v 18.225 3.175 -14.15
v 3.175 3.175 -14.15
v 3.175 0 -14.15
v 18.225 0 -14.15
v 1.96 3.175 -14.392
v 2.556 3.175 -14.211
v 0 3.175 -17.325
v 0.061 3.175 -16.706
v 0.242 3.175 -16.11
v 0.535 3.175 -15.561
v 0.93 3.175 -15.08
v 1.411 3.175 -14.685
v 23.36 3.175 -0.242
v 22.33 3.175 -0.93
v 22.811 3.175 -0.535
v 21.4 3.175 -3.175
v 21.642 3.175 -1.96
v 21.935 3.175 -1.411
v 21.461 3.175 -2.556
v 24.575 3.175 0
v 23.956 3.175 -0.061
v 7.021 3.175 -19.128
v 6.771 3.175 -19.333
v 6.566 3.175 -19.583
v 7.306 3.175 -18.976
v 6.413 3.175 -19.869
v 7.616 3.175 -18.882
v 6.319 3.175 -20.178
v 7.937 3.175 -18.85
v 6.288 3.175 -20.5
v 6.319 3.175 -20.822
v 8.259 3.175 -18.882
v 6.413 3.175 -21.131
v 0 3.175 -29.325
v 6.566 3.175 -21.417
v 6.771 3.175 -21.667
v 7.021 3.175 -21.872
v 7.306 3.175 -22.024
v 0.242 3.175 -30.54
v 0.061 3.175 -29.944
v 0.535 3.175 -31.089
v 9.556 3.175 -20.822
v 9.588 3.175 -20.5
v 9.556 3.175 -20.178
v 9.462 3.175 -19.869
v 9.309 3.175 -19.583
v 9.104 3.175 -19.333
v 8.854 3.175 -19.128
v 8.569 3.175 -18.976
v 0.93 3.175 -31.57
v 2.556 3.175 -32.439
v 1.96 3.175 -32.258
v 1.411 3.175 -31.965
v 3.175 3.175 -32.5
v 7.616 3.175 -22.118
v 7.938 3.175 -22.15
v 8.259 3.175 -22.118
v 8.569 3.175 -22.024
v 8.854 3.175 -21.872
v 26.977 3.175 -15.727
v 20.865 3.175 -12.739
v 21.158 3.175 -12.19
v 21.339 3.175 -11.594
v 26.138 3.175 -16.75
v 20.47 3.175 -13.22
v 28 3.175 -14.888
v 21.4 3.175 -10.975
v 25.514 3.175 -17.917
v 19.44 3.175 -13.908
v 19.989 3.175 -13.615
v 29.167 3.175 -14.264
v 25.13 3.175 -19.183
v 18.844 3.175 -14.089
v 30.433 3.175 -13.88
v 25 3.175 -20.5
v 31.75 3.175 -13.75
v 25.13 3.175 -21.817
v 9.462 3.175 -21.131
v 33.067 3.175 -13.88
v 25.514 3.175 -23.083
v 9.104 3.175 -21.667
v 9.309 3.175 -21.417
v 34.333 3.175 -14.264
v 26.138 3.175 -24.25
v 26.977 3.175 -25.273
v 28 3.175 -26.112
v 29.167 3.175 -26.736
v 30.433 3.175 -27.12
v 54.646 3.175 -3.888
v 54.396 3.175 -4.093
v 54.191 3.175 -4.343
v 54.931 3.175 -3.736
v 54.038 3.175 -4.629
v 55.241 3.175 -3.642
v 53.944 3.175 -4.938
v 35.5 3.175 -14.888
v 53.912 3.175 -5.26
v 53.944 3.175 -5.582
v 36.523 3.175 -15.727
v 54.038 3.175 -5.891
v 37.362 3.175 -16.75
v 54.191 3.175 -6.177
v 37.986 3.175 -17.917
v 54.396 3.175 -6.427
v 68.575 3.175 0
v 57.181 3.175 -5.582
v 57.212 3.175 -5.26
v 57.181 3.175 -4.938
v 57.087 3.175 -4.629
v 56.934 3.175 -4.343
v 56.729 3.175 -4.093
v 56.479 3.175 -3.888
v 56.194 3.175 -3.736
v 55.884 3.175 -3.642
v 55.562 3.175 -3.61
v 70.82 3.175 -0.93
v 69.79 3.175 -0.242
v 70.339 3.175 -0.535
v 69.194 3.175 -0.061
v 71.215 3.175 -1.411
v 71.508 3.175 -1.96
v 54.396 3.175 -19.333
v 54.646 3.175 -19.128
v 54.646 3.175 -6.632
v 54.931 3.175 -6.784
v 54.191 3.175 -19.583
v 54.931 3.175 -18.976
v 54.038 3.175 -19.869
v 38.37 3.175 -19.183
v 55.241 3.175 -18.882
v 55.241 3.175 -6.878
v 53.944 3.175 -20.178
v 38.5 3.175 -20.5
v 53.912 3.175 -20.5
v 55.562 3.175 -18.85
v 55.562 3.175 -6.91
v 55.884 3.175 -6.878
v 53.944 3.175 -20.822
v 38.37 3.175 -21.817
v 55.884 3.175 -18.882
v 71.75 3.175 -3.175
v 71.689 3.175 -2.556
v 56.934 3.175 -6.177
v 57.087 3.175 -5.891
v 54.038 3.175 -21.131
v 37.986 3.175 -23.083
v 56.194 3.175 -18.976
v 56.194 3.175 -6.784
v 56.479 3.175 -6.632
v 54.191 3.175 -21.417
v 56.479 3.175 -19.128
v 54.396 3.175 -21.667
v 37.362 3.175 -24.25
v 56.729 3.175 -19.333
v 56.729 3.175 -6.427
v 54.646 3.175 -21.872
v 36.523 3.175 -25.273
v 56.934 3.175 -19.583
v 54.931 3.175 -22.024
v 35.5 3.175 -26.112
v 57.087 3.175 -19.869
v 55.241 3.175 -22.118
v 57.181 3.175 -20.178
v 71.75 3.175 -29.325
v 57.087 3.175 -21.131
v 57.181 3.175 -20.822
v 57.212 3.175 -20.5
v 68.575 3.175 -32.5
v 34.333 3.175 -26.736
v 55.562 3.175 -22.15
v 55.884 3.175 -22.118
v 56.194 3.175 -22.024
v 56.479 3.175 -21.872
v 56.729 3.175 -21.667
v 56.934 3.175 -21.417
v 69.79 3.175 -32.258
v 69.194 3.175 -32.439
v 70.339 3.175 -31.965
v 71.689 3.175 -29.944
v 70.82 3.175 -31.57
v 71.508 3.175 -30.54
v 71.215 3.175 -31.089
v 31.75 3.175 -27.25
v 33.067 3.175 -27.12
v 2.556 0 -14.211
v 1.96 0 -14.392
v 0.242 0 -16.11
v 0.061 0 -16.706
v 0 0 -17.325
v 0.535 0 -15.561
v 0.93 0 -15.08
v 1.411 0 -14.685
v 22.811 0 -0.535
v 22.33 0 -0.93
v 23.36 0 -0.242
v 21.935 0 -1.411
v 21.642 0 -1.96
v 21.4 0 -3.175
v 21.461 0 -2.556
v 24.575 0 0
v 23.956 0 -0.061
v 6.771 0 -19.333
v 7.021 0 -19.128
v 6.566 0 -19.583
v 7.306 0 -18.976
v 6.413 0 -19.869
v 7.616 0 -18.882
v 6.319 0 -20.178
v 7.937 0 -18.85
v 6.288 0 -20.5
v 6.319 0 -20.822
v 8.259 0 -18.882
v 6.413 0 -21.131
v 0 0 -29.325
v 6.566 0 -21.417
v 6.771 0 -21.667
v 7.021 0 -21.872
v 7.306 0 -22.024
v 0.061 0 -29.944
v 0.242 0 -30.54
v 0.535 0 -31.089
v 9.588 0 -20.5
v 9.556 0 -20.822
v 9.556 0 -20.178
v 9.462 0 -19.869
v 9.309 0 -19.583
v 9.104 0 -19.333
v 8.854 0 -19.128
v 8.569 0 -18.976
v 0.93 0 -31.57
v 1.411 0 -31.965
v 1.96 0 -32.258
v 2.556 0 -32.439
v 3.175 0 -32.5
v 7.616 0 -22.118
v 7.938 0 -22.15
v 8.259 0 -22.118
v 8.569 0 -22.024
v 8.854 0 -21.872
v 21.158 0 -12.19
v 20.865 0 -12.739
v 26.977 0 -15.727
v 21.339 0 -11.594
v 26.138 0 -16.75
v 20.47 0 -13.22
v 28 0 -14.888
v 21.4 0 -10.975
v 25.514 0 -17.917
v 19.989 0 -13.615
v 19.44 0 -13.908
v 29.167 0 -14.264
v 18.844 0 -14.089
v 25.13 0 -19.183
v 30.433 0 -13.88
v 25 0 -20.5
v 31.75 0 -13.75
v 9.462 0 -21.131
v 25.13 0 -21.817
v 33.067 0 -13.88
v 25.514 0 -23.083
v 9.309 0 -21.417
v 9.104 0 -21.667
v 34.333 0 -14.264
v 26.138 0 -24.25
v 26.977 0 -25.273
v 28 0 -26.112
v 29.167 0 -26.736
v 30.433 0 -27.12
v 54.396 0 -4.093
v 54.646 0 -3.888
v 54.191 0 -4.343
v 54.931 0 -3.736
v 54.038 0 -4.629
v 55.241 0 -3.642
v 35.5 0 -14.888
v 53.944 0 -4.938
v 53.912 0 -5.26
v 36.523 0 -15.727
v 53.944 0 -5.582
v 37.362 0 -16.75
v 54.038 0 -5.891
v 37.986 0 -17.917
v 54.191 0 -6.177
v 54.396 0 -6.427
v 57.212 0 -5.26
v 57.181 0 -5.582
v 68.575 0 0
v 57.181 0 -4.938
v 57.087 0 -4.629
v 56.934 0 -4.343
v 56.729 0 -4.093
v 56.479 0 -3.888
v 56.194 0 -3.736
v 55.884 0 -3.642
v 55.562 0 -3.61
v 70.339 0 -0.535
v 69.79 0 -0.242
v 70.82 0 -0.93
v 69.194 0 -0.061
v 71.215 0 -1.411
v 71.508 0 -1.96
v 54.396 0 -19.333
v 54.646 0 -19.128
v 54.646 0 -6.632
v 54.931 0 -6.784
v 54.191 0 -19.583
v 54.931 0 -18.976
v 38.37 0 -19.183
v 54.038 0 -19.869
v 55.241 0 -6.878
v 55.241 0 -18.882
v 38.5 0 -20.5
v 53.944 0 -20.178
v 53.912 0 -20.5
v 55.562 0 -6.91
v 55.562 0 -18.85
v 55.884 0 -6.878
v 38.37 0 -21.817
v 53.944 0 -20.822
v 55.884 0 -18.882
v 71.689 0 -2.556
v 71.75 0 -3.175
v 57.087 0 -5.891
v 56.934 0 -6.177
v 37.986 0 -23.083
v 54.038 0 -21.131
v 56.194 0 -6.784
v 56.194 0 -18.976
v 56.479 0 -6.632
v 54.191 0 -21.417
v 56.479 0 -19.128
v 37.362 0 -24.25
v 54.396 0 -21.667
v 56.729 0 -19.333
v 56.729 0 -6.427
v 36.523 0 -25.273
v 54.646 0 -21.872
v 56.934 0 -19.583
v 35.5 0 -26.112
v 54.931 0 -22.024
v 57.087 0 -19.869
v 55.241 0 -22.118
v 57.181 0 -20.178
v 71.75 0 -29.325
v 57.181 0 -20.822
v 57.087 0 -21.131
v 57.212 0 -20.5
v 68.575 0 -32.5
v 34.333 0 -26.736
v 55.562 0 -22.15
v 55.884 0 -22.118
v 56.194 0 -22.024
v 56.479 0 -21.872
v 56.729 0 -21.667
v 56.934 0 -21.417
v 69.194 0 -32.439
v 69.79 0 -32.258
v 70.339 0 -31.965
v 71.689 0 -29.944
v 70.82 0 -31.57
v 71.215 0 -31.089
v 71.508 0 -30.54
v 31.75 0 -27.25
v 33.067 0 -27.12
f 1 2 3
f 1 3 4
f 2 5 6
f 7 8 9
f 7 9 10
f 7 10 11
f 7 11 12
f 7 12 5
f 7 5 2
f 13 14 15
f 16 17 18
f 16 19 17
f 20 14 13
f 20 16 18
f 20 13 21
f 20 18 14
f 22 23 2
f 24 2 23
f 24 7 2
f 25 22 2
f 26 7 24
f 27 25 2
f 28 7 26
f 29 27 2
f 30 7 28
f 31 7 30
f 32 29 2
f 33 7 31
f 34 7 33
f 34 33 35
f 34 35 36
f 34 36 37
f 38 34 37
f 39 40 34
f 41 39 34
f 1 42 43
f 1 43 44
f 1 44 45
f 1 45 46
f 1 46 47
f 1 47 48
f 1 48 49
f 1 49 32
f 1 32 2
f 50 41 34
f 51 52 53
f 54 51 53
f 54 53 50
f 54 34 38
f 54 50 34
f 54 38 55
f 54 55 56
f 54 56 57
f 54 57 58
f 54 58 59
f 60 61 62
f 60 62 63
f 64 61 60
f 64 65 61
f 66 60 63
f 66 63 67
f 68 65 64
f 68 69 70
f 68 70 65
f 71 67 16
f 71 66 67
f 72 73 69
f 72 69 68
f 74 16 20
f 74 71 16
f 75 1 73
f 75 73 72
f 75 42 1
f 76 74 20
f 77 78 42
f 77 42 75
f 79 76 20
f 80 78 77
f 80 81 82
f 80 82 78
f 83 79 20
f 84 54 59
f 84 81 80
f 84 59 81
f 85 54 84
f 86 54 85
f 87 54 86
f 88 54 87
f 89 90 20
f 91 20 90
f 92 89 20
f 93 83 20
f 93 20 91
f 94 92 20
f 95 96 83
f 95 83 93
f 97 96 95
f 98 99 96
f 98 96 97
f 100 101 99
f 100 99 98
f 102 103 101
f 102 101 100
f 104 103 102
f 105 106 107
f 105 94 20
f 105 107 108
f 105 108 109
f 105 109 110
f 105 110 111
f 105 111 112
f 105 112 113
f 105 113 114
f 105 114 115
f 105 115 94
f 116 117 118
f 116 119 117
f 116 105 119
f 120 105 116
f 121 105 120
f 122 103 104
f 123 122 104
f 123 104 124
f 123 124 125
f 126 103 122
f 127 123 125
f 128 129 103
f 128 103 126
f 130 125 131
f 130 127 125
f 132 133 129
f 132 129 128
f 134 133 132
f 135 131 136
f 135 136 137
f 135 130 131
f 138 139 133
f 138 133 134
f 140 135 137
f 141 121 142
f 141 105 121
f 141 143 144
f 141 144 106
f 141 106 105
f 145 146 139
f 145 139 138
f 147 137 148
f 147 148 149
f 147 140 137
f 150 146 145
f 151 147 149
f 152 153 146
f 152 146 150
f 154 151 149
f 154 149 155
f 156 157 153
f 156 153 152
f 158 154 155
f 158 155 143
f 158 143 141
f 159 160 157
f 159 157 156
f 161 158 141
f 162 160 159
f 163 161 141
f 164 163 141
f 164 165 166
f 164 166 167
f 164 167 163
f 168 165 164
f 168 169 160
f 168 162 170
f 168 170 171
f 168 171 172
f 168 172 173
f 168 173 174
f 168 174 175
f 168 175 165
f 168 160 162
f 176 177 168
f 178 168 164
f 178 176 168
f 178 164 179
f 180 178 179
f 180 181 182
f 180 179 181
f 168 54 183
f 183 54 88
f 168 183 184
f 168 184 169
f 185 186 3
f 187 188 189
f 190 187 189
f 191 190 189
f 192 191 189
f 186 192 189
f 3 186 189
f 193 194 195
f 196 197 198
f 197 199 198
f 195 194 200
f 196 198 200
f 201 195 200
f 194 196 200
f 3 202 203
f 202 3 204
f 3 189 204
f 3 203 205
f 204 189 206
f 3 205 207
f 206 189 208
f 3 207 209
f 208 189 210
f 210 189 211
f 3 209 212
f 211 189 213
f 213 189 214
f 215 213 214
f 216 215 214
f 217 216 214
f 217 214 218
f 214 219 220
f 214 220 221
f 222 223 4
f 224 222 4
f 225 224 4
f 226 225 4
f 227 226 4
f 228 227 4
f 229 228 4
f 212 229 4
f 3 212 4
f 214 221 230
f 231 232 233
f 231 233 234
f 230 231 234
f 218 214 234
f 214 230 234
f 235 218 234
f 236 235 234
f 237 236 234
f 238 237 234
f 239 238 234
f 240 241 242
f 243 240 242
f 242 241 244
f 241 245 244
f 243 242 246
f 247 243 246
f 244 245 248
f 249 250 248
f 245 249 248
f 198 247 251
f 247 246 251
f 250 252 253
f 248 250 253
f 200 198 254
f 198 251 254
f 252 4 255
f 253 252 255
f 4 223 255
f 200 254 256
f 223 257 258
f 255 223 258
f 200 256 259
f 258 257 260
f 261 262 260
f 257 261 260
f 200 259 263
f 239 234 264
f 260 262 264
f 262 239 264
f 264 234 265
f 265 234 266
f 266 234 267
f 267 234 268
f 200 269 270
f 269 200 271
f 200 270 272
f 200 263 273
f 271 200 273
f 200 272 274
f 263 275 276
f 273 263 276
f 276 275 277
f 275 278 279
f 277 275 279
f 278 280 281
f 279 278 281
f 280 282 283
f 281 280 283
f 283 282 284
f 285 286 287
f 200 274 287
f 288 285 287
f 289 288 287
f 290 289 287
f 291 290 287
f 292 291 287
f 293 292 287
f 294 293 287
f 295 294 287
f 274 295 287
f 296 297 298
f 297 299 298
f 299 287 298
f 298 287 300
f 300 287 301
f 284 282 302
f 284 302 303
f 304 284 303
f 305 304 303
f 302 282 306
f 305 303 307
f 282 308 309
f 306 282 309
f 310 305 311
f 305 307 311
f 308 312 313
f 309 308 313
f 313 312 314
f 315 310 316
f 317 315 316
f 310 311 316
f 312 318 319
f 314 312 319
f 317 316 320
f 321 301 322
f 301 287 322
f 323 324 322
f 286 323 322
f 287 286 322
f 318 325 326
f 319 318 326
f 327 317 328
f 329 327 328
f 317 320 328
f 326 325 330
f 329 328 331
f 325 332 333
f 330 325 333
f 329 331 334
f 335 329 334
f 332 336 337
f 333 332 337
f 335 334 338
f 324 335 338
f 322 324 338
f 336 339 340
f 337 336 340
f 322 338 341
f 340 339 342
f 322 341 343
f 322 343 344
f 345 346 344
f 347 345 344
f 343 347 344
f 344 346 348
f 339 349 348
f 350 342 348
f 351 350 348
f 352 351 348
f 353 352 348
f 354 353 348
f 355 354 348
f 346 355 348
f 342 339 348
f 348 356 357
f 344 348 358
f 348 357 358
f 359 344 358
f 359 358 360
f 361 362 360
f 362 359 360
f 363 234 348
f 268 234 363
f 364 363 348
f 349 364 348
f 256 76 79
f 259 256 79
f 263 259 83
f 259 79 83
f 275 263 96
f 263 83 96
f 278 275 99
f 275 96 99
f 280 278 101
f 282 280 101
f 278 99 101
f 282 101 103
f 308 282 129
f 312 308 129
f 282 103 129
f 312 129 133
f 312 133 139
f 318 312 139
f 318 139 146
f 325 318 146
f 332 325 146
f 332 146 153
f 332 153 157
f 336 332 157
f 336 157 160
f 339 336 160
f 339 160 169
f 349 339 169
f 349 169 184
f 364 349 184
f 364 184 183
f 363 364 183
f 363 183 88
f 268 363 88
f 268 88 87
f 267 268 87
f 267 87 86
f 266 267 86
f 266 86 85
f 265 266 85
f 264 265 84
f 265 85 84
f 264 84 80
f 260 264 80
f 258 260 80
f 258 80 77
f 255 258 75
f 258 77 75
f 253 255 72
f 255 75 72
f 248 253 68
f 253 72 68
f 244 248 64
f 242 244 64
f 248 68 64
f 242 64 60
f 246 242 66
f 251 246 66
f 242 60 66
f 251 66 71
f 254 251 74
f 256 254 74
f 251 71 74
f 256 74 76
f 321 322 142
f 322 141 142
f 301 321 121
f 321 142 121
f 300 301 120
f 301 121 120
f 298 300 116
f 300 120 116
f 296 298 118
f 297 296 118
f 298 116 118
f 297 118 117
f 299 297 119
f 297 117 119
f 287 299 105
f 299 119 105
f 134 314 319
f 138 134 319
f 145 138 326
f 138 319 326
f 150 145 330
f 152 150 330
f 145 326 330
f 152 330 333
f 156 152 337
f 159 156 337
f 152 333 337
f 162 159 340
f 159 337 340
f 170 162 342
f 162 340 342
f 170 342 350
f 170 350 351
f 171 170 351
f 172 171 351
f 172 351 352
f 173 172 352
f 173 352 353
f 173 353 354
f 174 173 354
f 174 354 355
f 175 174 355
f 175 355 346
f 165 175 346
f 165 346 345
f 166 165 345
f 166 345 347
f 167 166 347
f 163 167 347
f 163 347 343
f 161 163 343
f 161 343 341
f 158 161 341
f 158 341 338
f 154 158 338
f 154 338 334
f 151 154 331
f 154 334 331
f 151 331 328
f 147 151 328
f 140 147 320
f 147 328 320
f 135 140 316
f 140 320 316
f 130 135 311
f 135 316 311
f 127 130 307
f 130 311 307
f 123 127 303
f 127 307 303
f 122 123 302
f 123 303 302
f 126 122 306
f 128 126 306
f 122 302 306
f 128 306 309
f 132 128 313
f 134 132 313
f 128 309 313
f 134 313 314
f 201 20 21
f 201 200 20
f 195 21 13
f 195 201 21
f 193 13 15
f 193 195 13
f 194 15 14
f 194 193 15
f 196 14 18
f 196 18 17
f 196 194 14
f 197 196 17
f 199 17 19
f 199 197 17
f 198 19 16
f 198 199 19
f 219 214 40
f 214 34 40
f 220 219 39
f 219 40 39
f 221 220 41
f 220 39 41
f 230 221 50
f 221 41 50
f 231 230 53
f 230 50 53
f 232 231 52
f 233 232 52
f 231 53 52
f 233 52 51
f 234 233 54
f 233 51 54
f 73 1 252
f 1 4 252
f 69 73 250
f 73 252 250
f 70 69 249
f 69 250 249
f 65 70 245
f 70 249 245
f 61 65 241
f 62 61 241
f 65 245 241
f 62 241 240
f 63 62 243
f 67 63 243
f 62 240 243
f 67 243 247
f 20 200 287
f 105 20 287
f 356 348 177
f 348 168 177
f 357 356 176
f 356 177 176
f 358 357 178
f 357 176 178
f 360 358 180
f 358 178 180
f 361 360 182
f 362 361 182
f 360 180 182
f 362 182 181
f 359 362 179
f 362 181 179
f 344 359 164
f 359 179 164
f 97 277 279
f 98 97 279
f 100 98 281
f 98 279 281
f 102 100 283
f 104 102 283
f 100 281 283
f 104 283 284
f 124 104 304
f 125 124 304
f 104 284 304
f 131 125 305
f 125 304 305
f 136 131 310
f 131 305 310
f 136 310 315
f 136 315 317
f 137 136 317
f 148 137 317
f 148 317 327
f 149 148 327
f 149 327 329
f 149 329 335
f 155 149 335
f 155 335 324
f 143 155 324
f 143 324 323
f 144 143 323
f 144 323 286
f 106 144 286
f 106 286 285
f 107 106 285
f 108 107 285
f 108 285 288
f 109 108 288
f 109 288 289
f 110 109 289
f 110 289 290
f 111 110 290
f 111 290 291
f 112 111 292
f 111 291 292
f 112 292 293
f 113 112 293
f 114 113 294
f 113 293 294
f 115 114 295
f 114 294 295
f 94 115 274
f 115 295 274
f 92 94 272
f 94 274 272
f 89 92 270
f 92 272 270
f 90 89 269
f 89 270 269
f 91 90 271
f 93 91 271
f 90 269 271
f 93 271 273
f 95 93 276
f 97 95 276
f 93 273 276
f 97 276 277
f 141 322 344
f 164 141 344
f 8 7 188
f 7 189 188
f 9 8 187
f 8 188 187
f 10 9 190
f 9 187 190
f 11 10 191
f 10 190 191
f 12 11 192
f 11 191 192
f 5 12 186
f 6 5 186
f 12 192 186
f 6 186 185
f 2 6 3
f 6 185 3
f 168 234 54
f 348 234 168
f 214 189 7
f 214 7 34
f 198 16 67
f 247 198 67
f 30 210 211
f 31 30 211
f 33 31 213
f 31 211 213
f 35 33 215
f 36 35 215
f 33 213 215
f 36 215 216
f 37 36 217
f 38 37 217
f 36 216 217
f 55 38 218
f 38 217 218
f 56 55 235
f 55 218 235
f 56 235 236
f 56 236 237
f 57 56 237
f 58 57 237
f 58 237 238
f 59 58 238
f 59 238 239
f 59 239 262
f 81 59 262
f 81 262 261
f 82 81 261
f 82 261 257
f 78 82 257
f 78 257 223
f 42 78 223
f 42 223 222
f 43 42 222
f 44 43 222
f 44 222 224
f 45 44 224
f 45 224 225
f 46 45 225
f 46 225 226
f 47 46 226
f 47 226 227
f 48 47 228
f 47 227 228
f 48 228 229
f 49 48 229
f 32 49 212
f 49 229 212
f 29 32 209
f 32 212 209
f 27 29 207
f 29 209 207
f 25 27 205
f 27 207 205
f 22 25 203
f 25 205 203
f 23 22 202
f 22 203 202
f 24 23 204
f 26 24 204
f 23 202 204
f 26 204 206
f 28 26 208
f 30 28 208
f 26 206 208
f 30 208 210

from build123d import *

# Parameters (mm, degrees)
SKETCH1_W             = 71.75
SKETCH1_H             = 32.5
BOSS_EXTRUDE1_DEPTH   = 3.175
M4X0_7_TAPPED_HOLE1_D = 3.3
SKETCH5_R             = 6.75
CUT_EXTRUDE1_DEPTH    = 79.831422193
SKETCH6_W             = 21.4
SKETCH6_H             = 14.15
CUT_EXTRUDE2_DEPTH    = 79.831422193
FILLET1_R             = 3.175


with BuildPart() as part:
    # Sketch1 → Boss-Extrude1 (new body)
    with BuildSketch(Plane(origin=(0, 0, 0), x_dir=(1, 0, 0), z_dir=(0, 1, 0))):
        with Locations((35.875, 16.25)):
            Rectangle(SKETCH1_W, SKETCH1_H)
    extrude(amount=BOSS_EXTRUDE1_DEPTH)

    # M4x0.7 Tapped Hole1 (through all)
    with Locations(Plane(origin=(0, 3.175, 0), x_dir=(1, 0, 0), z_dir=(0, 1, 0))):
        with Locations((7.9375, 20.5), (55.5625, 20.5), (55.5625, 5.26)):
            Hole(M4X0_7_TAPPED_HOLE1_D / 2)

    # Sketch5 → Cut-Extrude1 (cut, through all)
    with BuildSketch(Plane(origin=(0, 3.175, 0), x_dir=(1, 0, 0), z_dir=(0, 1, 0))):
        with Locations((31.75, 20.5)):
            Circle(SKETCH5_R)
    extrude(amount=-CUT_EXTRUDE1_DEPTH, mode=Mode.SUBTRACT)

    # Sketch6 → Cut-Extrude2 (cut, through all)
    with BuildSketch(Plane(origin=(0, 3.175, 0), x_dir=(1, 0, 0), z_dir=(0, 1, 0))):
        with Locations((10.7, 7.075)):
            Rectangle(SKETCH6_W, SKETCH6_H)
    extrude(amount=-CUT_EXTRUDE2_DEPTH, mode=Mode.SUBTRACT)

    # Fillet1
    fillet1_edges = [part.edges().sort_by_distance(p)[0] for p in [
        (0, 1.5875, -32.5),
        (71.75, 1.5875, -32.5),
        (71.75, 1.5875, 0),
        (0, 1.5875, -14.15),
        (21.4, 1.5875, -14.15),
        (21.4, 1.5875, 0),
    ]]
    fillet(fillet1_edges, radius=FILLET1_R)


solid = part.part
